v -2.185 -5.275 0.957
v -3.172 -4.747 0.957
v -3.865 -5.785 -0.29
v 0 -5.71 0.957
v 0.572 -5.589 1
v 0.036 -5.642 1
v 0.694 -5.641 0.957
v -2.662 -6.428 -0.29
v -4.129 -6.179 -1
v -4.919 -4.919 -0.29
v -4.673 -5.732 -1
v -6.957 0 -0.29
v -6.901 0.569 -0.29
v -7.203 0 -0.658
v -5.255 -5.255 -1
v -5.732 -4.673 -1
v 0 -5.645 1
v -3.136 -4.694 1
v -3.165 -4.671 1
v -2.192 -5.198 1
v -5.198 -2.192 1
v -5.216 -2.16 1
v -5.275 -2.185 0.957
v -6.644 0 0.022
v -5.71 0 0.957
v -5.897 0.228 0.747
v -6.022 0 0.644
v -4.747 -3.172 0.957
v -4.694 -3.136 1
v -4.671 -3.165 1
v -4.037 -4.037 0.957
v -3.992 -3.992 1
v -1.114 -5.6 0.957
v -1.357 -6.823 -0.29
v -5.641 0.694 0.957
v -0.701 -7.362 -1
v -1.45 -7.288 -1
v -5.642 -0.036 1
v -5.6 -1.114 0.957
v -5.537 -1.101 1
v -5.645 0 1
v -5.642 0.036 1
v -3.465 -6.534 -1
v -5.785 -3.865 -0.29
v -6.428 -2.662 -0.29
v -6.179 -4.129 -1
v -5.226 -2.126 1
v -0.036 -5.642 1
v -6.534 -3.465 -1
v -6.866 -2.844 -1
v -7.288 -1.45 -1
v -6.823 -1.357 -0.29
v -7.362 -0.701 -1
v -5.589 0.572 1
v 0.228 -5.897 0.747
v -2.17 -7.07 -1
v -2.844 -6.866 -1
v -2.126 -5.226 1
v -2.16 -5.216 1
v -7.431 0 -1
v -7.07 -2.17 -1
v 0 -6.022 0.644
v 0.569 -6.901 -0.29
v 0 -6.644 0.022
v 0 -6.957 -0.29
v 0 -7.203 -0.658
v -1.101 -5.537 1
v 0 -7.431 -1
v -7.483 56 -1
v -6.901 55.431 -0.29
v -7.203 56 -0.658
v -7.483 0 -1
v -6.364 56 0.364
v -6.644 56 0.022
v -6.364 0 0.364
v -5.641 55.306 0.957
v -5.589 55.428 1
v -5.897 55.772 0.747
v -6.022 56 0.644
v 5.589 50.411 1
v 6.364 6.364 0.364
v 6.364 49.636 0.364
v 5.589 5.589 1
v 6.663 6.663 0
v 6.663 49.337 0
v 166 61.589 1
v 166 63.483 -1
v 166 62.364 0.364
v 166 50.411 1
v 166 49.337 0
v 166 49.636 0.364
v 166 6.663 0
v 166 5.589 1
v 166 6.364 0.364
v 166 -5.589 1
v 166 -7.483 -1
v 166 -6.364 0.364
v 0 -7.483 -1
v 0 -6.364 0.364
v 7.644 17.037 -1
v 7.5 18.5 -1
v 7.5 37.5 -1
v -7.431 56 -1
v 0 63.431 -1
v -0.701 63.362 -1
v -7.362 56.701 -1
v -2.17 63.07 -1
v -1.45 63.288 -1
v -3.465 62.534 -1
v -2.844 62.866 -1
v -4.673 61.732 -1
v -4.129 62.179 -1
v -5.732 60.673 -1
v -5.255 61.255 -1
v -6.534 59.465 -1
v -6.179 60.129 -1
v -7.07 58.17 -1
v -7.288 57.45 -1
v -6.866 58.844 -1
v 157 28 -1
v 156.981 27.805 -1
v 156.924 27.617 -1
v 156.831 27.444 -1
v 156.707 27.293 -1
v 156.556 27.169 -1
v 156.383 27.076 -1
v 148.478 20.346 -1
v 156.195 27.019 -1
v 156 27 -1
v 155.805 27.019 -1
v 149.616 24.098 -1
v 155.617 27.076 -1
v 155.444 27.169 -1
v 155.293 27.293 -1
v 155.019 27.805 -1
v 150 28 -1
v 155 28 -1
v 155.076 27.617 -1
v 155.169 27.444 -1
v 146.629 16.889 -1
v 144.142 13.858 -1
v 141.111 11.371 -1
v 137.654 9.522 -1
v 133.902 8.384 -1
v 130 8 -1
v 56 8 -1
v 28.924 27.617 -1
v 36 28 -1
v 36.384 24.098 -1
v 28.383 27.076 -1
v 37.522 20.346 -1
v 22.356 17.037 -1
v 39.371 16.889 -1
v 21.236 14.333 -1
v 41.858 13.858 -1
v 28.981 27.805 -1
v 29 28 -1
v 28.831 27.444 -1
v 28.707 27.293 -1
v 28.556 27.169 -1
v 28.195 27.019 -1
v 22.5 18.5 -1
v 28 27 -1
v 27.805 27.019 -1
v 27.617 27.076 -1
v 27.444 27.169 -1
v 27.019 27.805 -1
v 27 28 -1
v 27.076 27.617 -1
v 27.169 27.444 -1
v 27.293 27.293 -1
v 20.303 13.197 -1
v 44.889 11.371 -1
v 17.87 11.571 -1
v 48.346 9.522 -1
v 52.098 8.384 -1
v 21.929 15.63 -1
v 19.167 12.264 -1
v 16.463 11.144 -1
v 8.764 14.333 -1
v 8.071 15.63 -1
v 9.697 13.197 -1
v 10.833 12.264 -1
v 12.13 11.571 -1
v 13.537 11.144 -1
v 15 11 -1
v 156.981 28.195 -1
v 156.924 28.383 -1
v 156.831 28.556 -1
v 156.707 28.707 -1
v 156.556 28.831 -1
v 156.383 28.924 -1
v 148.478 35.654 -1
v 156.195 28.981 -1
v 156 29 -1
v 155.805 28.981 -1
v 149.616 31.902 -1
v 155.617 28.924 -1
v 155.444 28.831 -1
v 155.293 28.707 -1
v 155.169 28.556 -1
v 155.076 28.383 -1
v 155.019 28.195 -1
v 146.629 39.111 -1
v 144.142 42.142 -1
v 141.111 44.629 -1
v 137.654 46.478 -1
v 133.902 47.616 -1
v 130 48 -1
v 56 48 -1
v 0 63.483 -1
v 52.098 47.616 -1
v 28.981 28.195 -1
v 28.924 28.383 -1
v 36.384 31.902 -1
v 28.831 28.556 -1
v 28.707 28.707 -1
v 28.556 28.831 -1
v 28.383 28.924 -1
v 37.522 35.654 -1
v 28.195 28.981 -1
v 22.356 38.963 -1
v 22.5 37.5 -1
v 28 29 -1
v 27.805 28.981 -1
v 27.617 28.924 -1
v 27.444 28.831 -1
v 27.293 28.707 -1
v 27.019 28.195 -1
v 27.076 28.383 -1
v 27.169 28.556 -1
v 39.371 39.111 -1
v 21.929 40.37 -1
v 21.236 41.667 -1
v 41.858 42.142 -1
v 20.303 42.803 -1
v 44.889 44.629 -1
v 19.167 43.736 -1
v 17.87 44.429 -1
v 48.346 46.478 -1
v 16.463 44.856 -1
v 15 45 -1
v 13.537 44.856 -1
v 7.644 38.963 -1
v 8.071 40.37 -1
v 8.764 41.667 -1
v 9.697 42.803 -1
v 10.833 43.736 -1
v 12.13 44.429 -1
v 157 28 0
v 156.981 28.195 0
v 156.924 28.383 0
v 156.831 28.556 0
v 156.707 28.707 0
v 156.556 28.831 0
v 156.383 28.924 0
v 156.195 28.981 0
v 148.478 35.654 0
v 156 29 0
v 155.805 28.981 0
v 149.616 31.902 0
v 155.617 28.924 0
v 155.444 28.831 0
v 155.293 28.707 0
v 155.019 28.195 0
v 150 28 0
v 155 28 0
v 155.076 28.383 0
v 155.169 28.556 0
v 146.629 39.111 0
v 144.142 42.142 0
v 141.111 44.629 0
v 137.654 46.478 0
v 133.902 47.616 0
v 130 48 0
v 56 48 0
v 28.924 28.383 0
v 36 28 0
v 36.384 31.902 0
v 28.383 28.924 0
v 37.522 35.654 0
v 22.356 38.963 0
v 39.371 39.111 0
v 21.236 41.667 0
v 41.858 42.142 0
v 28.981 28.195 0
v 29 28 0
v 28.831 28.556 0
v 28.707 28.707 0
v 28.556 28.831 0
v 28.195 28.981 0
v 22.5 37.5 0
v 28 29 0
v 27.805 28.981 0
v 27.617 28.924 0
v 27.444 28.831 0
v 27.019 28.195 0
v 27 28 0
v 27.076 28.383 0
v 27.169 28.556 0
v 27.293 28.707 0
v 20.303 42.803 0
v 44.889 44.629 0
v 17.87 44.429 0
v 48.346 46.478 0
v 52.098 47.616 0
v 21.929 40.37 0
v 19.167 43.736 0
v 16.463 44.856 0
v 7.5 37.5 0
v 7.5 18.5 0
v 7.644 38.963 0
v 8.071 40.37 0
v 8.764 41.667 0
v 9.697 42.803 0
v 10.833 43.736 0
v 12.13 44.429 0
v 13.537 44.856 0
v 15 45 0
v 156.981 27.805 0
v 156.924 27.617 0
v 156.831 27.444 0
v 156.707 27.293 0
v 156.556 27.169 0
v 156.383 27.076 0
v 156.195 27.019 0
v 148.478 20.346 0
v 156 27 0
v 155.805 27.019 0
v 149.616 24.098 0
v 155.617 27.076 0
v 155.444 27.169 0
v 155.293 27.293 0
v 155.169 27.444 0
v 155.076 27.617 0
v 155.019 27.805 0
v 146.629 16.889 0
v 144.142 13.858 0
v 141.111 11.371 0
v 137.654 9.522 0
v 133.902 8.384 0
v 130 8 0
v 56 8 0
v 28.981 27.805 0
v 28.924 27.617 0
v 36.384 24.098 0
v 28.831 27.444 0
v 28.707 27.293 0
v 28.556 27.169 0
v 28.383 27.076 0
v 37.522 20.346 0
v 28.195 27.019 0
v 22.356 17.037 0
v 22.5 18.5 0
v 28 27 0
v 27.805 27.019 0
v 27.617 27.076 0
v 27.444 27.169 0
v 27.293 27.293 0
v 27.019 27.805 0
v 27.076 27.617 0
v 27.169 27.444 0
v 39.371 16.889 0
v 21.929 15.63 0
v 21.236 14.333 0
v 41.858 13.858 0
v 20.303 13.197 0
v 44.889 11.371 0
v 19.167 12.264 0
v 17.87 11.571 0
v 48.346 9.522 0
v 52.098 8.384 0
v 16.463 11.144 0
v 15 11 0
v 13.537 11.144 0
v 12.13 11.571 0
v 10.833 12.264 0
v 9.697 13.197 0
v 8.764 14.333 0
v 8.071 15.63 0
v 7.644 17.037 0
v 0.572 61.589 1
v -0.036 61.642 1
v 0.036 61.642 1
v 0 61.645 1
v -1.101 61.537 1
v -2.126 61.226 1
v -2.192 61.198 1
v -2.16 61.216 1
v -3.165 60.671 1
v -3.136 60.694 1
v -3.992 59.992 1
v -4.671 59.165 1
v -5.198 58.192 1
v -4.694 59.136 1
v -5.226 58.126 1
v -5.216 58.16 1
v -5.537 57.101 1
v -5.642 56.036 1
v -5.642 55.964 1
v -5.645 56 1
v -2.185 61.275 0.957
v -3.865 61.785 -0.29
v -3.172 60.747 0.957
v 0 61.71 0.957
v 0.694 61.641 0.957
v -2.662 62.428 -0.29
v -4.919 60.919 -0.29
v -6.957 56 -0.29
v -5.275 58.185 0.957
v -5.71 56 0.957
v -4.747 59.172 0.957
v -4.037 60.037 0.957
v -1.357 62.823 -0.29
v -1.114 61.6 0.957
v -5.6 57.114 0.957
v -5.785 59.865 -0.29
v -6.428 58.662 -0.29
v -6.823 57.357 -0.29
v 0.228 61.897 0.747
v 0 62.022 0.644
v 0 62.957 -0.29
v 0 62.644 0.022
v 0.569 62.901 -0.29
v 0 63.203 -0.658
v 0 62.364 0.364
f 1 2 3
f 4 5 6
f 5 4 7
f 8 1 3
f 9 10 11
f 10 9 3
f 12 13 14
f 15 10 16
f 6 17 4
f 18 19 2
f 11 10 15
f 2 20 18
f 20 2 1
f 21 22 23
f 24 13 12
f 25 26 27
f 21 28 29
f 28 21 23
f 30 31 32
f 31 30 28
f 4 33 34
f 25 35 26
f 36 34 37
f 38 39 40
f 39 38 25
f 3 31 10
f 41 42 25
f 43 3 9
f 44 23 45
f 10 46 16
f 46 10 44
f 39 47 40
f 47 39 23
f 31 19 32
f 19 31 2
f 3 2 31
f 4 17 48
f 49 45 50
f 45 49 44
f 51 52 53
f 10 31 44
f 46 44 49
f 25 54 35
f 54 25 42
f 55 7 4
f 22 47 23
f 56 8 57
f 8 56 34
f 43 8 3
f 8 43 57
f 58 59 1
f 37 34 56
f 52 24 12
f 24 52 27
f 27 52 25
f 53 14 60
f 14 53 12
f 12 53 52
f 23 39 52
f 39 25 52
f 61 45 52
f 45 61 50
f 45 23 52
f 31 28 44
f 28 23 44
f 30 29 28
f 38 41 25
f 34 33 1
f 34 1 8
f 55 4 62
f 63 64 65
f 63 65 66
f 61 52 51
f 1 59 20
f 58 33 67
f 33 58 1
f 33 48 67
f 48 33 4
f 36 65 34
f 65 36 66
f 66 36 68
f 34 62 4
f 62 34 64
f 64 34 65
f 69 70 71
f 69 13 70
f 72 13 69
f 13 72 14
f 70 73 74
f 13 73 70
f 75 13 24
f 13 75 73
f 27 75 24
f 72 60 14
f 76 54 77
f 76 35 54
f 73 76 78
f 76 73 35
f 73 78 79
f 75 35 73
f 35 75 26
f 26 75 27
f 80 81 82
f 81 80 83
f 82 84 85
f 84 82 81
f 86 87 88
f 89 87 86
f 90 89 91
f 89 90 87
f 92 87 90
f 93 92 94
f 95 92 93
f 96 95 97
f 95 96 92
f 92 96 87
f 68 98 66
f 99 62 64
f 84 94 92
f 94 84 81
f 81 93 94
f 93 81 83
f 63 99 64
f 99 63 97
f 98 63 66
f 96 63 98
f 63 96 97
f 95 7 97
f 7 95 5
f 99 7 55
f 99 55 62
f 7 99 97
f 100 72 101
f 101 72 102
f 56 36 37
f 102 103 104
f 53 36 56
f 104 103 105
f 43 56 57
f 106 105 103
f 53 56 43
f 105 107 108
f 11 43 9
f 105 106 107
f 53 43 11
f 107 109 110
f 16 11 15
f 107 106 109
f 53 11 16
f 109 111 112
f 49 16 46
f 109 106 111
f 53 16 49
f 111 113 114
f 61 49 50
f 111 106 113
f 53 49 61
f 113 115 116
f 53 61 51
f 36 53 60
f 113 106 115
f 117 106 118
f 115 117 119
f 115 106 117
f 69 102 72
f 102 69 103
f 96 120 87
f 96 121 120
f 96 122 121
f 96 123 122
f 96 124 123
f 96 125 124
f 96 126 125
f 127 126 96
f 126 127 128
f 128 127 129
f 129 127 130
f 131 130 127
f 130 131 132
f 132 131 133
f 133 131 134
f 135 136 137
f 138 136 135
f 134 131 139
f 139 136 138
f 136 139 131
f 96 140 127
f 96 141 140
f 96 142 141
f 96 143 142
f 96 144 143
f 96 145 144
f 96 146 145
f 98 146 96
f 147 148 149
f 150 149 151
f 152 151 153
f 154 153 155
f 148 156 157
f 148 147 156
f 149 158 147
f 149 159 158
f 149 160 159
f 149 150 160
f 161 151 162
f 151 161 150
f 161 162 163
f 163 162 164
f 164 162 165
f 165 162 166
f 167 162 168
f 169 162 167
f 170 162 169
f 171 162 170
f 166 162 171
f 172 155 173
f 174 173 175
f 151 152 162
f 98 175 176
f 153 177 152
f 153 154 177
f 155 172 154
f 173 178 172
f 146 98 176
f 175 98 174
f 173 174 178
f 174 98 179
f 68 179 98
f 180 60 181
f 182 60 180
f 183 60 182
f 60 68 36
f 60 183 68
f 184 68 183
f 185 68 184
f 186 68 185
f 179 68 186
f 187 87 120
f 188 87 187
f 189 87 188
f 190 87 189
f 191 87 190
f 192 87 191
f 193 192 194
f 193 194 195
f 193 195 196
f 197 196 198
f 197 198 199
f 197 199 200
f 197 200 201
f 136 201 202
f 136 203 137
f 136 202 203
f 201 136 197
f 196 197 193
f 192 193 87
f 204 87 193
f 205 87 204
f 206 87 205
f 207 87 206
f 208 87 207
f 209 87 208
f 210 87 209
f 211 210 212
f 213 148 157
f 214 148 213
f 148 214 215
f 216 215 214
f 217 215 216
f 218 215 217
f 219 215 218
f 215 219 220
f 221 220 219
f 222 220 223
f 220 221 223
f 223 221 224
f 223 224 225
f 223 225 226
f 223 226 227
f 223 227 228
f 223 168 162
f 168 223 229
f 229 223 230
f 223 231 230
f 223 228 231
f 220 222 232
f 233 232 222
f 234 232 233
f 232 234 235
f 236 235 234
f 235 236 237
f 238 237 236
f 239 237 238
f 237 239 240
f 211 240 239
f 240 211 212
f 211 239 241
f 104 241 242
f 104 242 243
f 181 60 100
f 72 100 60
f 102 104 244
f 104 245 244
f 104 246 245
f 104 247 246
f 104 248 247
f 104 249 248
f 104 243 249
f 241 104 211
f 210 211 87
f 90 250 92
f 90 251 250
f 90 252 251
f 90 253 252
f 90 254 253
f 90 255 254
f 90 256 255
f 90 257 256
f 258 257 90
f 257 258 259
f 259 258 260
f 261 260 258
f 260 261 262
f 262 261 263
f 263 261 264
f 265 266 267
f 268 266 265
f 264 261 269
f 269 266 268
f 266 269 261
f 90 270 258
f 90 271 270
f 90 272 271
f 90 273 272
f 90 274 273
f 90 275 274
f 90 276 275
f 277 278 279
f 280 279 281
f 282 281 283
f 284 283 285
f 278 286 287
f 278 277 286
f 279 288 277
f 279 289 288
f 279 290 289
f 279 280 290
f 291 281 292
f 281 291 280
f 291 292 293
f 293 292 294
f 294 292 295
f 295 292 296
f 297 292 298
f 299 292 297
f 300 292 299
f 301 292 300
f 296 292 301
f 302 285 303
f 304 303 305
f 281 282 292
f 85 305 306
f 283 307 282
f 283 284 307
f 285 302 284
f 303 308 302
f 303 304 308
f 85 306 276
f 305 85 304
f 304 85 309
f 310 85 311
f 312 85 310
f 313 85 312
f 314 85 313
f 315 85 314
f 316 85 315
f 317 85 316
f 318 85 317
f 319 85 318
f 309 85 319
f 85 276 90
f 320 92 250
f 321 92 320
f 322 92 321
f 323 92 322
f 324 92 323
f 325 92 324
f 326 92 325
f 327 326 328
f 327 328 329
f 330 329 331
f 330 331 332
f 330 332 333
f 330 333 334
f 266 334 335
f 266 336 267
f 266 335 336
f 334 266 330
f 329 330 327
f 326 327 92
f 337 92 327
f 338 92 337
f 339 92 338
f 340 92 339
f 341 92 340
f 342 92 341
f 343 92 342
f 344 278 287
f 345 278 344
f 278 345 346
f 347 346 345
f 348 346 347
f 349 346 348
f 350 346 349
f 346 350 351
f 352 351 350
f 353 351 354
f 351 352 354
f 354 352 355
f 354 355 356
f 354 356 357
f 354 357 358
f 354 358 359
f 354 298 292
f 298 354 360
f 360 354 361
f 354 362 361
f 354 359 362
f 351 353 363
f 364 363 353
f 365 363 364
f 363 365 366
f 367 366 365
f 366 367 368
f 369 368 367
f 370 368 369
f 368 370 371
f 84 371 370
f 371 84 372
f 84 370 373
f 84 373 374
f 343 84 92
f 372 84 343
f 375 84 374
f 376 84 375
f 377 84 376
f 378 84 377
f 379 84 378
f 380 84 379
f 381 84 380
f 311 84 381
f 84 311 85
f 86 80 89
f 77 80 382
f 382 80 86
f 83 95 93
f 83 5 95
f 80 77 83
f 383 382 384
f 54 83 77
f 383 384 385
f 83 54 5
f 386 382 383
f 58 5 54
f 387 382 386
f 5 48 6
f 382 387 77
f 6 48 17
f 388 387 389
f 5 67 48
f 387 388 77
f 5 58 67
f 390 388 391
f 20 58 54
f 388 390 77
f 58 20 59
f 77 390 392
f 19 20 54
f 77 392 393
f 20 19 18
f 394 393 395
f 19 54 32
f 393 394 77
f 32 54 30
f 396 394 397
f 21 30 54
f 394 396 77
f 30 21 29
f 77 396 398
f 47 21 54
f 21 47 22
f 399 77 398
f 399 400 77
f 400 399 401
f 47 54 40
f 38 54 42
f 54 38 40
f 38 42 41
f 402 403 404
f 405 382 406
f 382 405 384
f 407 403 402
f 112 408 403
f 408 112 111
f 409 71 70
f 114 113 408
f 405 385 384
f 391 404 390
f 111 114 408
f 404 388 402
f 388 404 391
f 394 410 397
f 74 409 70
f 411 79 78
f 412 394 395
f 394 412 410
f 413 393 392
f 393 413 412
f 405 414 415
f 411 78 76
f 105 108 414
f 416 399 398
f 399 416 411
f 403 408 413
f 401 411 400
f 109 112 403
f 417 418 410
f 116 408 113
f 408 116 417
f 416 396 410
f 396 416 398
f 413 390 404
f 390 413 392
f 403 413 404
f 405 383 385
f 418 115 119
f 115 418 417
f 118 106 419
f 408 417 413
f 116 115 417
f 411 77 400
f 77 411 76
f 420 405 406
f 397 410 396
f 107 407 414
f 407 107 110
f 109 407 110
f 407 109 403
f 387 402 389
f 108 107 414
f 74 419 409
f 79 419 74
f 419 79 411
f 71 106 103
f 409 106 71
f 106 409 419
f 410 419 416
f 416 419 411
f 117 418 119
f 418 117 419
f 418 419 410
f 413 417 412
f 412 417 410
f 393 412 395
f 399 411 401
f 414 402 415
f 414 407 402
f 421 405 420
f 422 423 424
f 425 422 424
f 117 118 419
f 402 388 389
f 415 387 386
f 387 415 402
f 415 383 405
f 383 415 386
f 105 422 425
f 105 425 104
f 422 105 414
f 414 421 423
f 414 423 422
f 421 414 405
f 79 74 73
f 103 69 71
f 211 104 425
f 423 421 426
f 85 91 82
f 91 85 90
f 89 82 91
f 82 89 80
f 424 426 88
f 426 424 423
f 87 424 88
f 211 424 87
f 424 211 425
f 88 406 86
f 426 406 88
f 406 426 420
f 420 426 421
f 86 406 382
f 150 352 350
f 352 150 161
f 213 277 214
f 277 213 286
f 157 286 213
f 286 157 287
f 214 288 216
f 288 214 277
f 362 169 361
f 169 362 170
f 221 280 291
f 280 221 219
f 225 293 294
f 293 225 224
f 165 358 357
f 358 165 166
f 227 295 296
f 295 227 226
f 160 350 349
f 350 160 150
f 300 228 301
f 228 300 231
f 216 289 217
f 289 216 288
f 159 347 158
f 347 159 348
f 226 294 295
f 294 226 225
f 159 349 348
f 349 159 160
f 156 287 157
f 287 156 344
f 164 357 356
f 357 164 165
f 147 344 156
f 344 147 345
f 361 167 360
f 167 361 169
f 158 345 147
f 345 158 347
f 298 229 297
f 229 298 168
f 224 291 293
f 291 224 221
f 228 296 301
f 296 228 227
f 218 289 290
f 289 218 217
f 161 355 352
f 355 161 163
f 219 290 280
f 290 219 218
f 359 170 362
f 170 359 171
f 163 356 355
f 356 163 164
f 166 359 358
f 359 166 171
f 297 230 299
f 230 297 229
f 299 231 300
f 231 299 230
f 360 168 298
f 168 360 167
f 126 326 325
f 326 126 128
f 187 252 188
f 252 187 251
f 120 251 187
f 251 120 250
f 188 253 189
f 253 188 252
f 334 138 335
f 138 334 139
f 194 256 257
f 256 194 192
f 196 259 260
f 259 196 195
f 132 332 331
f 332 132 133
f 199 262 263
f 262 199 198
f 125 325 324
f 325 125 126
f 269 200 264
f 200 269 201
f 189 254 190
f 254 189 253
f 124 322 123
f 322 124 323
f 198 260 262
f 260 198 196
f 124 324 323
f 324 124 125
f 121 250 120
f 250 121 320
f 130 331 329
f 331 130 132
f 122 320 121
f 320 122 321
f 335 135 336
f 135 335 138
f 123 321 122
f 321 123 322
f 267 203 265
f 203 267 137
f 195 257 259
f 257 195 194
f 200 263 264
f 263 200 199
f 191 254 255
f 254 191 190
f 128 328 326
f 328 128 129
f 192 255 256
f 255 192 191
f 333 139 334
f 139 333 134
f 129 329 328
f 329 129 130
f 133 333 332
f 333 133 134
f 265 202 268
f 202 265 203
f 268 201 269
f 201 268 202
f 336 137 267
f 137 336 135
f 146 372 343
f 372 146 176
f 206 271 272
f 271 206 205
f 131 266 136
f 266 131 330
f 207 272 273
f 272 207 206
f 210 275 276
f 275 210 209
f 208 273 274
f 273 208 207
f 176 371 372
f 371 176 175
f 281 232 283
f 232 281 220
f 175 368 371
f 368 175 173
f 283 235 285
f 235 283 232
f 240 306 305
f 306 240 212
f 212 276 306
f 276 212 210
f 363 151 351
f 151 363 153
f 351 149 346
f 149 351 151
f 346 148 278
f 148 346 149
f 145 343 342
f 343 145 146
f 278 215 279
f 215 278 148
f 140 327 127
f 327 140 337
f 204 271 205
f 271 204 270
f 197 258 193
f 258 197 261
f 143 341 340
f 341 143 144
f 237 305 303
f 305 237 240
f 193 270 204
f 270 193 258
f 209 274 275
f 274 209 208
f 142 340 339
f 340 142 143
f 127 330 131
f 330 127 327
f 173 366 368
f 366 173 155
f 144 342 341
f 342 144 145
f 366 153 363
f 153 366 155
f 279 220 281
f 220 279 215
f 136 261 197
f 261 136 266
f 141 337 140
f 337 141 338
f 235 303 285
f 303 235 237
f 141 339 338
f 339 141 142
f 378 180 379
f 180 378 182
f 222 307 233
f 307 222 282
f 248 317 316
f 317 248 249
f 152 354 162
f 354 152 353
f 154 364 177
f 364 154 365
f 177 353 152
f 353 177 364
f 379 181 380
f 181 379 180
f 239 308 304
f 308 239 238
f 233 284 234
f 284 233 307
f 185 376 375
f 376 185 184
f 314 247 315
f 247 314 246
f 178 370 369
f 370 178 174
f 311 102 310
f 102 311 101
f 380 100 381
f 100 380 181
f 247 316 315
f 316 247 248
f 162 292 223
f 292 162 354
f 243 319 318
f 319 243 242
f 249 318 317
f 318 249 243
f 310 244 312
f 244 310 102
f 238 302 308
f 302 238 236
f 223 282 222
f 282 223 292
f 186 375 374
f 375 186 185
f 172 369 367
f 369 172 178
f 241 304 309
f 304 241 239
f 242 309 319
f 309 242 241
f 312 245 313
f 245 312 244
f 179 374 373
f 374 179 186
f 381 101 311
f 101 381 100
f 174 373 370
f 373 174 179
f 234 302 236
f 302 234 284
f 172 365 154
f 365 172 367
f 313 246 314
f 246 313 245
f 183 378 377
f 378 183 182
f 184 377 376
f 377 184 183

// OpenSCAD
// file: syms.scad
module symY(t) {
    translate(t)
        children();
    mirror([0,1,0])
        translate(t)
            children();
}
module symX(t) {
    translate(t)
        children();
    mirror([1,0,0])
        translate(t)
            children();
}

module symZ(t) {
    translate(t)
        children();
    mirror([0,0,1])
        translate(t)
            children();
}

module	symXY(t) {
	tx=t[0];
	ty=t[1];
	tz=t[2];
	symX([tx,0,0])
	symY([0,ty,tz])
		children();
}

module magnetCut(D,S) {
    cylinder(d=D,h=10);
    for(d=[45,-45])
    rotate(d)
    cube([2*D,S,30],center=true);
}


// calculates the radius from "segment" paramers:
// https://en.wikipedia.org/wiki/Circular_segment
function    circleSlice2radius2(c,h) = (c*c/8/h)+ h/2;

function toInt(str) = 
    let(d = [for (s = str) ord(s) - 48], l = len(d) - 1)
    [for (i = 0, a = d[i];i <= l;i = i + 1, a = 10 * a + d[i]) a][l];
        
// main file
use <syms.scad>
//https://nettfront.hu/hu/termekek/ii-kategoria/a12-r6

$fn=32;

W=1;

D=18;
HX=128+56/2+10;
HY=56/2+10;

module base() {
    mirror([0,0,1])
    intersection() {
        union() {
            translate([0,0,D/2-3]) {
                sphere(d=D);
                rotate(-90,[1,0,0])
                cylinder(d=D,h=HY);
                rotate(90,[0,1,0])
                cylinder(d=D,h=HX);
            }
            cube([HX,HY,W]);
        }
        cube(2*[HX,HY,W],center=true);
    }
}

difference() {
    union() {
        base();
        translate([0,50+6,0])
        mirror([0,1,0])
        base();
    }
    for(x=[0,128])
        translate([x+56/2,56/2,0])
        cylinder(d=2,h=100,center=true);
    
    // simplify
    translate([HX/2+10,56/2,0])
    hull()
    symX([37,0,0])
    cylinder(d=40,h=10,center=true);


    
    translate([15,HY-10,0])
    hull()
    symY([0,HY/4,0])
    cylinder(d=15,h=10,center=true);
   
}
